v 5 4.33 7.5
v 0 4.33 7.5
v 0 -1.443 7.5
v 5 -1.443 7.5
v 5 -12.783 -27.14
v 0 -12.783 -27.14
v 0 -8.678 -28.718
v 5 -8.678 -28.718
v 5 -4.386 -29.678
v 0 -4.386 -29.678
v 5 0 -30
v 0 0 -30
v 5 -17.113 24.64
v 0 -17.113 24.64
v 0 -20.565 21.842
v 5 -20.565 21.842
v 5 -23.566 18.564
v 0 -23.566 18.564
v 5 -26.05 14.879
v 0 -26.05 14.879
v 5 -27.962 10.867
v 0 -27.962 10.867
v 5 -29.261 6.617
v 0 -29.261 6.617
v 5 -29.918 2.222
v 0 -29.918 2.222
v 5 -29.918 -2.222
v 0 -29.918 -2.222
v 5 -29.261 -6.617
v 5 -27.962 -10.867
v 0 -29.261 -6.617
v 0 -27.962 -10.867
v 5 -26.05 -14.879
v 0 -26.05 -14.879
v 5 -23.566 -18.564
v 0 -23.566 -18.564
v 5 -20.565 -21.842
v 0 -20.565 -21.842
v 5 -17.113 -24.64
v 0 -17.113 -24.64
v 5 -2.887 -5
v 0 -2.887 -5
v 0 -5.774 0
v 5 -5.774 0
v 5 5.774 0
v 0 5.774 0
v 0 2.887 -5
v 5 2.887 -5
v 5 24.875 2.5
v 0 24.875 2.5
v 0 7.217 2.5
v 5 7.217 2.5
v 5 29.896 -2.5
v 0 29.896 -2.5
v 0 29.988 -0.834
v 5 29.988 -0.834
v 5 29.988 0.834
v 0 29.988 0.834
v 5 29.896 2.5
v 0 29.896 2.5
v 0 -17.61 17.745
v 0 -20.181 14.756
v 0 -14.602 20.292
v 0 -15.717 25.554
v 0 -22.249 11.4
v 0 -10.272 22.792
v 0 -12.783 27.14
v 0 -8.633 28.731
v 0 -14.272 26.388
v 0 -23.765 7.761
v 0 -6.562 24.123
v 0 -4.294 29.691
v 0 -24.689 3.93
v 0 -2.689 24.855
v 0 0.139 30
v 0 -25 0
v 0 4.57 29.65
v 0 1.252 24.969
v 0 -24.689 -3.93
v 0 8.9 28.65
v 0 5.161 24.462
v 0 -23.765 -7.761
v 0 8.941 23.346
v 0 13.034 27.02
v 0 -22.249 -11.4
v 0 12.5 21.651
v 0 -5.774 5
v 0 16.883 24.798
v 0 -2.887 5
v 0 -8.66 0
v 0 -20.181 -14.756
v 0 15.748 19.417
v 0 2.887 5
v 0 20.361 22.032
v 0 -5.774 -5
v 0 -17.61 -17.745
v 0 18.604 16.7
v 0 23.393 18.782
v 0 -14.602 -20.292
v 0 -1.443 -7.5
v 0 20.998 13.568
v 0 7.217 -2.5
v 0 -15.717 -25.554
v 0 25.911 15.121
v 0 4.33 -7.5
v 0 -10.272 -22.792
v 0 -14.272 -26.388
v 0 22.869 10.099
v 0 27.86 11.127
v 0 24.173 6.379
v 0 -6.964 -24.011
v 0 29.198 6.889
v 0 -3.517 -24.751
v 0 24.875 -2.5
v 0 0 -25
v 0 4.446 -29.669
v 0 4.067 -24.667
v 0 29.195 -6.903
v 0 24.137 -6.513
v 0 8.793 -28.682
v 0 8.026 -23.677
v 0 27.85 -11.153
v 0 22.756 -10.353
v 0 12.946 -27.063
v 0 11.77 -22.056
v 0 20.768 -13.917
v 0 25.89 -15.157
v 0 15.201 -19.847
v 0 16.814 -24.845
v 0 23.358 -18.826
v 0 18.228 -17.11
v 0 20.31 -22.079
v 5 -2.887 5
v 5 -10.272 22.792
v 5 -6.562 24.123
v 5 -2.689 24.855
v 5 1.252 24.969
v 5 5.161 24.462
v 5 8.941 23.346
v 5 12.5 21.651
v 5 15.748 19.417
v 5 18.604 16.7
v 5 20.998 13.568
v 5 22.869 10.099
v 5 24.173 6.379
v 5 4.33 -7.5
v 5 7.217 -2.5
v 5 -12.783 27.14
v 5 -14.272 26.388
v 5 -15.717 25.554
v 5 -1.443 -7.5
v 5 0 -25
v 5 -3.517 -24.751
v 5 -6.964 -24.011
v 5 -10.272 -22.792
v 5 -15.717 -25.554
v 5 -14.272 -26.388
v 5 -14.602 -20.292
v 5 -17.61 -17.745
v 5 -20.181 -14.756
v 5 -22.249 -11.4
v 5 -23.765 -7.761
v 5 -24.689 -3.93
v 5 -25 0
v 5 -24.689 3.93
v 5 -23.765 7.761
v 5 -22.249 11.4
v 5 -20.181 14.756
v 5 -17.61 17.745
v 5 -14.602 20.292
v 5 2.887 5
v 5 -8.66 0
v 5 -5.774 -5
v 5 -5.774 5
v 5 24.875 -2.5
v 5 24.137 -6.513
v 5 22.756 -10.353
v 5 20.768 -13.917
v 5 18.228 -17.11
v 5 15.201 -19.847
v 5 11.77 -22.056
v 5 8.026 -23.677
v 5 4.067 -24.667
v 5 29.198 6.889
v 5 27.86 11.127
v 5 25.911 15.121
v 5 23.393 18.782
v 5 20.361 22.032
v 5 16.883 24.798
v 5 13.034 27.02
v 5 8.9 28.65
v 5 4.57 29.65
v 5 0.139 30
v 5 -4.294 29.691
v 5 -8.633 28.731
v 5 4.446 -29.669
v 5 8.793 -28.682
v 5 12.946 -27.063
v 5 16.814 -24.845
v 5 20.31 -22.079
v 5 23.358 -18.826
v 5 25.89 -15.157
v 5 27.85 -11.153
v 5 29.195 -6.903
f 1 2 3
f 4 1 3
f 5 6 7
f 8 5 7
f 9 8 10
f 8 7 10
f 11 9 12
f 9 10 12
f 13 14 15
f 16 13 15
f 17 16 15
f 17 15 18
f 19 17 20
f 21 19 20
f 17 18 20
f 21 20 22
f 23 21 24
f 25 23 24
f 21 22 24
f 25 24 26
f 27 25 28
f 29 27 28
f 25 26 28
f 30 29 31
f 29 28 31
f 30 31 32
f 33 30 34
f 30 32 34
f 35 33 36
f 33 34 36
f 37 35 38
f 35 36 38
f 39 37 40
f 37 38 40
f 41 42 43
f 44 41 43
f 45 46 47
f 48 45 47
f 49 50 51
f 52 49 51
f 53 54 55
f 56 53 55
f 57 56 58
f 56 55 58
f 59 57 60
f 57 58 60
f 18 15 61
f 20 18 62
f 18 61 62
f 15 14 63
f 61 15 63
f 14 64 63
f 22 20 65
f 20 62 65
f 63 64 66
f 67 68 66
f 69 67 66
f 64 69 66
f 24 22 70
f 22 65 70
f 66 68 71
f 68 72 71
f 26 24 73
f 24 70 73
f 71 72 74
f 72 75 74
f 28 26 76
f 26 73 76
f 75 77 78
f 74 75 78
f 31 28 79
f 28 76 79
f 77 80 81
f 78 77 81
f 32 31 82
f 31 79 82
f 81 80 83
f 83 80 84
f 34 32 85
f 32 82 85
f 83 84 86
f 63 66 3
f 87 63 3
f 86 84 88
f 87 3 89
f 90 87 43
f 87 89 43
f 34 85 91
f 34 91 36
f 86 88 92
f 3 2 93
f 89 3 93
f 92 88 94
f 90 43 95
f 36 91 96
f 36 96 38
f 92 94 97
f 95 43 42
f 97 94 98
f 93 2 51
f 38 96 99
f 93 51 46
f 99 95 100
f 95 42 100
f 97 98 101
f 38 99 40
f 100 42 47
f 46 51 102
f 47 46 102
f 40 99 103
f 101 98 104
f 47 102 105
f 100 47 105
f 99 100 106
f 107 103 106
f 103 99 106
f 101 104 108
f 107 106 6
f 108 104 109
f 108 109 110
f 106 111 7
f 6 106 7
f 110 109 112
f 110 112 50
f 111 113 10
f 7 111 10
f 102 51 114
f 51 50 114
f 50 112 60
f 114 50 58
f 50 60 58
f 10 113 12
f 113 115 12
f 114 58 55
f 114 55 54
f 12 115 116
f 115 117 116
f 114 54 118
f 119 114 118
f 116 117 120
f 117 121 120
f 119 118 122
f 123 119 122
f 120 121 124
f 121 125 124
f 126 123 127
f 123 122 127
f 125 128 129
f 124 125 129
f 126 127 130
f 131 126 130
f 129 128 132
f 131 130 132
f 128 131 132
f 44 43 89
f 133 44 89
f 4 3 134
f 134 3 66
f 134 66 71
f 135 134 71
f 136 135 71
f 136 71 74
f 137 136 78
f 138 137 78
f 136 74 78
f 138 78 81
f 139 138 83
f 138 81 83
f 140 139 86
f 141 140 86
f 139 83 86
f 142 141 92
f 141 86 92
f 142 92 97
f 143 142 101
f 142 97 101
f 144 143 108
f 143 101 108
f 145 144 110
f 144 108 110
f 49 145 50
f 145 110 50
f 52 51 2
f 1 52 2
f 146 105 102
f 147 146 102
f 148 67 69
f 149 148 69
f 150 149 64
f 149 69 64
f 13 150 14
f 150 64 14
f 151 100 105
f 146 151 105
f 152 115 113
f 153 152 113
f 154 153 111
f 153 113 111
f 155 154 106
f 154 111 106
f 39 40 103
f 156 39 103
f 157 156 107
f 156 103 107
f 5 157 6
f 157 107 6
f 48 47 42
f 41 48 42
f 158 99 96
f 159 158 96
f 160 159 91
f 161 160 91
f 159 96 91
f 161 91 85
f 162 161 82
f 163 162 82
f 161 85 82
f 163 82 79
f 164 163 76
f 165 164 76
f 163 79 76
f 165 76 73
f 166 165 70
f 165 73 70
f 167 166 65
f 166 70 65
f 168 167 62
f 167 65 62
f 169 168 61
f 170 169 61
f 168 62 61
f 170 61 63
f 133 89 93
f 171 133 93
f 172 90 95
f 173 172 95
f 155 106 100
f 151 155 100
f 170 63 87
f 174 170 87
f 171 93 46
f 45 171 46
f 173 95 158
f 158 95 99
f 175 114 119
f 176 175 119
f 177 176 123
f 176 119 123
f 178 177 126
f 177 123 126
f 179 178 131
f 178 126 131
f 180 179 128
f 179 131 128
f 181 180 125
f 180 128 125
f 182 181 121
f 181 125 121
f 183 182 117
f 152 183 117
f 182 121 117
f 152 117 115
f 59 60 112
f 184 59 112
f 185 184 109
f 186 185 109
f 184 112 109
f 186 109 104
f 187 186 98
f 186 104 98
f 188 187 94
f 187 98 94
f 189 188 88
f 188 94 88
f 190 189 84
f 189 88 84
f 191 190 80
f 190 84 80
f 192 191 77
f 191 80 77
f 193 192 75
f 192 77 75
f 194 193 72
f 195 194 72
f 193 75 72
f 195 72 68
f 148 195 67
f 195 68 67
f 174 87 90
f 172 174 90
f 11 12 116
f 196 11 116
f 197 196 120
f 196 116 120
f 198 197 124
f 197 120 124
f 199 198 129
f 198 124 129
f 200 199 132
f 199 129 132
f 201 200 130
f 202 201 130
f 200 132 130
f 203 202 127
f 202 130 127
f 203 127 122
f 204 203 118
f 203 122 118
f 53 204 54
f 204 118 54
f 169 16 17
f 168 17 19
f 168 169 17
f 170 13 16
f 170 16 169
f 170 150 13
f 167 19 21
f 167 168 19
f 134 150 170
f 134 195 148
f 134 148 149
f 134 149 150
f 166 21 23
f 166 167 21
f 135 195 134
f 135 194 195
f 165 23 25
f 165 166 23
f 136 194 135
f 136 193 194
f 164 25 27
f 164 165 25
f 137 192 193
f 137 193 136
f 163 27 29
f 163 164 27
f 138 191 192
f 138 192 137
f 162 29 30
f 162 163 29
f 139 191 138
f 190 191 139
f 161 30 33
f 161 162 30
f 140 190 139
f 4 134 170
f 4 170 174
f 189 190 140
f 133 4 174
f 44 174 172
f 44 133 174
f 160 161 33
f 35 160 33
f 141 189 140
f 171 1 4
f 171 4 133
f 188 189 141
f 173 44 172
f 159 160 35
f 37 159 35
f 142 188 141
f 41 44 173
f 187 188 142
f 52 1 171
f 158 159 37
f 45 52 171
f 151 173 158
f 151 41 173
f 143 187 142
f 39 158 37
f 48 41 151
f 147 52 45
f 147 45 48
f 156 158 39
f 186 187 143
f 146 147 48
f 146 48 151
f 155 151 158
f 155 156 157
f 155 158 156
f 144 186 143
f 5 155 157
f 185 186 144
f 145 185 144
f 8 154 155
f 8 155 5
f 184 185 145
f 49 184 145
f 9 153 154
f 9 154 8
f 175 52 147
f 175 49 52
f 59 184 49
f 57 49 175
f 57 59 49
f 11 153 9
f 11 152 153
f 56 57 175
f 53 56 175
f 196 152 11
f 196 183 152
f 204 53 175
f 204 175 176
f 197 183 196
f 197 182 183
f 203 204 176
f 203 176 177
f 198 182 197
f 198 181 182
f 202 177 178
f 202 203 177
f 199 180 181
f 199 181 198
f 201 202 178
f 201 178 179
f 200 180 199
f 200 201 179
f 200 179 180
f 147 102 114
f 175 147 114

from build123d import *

# Parameters (mm, degrees)
BOSS_EXTRUDE1_DEPTH = 5


with BuildPart() as part:
    # Sketch1 → Boss-Extrude1 (new body)
    with BuildSketch(Plane(origin=(0, 0, 0), x_dir=(0, 0, -1), z_dir=(1, 0, 0))):
        with BuildLine():
            Line((2.5, 29.895651858), (2.5, 24.874685928))
            ThreePointArc((2.5, 24.874685928), (18.540496218, 16.770509831), (25, 0))
            ThreePointArc((25, 0), (24.441795639, -5.253439439), (22.792109925, -10.272279454))
            Line((22.792109925, -10.272279454), (27.140393972, -12.782762419))
            ThreePointArc((27.140393972, -12.782762419), (29.276371182, -6.549358016), (30, 0))
            ThreePointArc((30, 0), (22.079402166, 20.310096012), (2.5, 29.895651858))
        make_face()
        with BuildLine():
            ThreePointArc((-22.792109925, -10.272279454), (-21.650635095, 12.5), (-2.5, 24.874685928))
            Line((-2.5, 24.874685928), (-2.5, 29.895651858))
            ThreePointArc((-2.5, 29.895651858), (-25.980762114, 15), (-27.140393972, -12.782762419))
            Line((-27.140393972, -12.782762419), (-22.792109925, -10.272279454))
        make_face()
        with BuildLine():
            Line((-2.5, 29.895651858), (-2.5, 24.874685928))
            ThreePointArc((-2.5, 24.874685928), (0, 25), (2.5, 24.874685928))
            Line((2.5, 24.874685928), (2.5, 29.895651858))
            ThreePointArc((2.5, 29.895651858), (0, 30), (-2.5, 29.895651858))
        make_face()
        with BuildLine():
            ThreePointArc((22.792109925, -10.272279454), (21.650635095, -12.5), (20.292109925, -14.602406473))
            Line((20.292109925, -14.602406473), (24.640393972, -17.112889438))
            ThreePointArc((24.640393972, -17.112889438), (25.980762114, -15), (27.140393972, -12.782762419))
            Line((27.140393972, -12.782762419), (22.792109925, -10.272279454))
        make_face()
        with BuildLine():
            ThreePointArc((20.292109925, -14.602406473), (0, -25), (-20.292109925, -14.602406473))
            Line((-20.292109925, -14.602406473), (-24.640393972, -17.112889438))
            ThreePointArc((-24.640393972, -17.112889438), (0, -30), (24.640393972, -17.112889438))
            Line((24.640393972, -17.112889438), (20.292109925, -14.602406473))
        make_face()
        with BuildLine():
            ThreePointArc((-20.292109925, -14.602406473), (-21.650635095, -12.5), (-22.792109925, -10.272279454))
            Line((-22.792109925, -10.272279454), (-27.140393972, -12.782762419))
            ThreePointArc((-27.140393972, -12.782762419), (-25.980762114, -15), (-24.640393972, -17.112889438))
            Line((-24.640393972, -17.112889438), (-20.292109925, -14.602406473))
        make_face()
        with BuildLine():
            Line((7.5, -4.330127019), (5, -5.773502692))
            Line((5, -5.773502692), (20.292109925, -14.602406473))
            ThreePointArc((20.292109925, -14.602406473), (21.650635095, -12.5), (22.792109925, -10.272279454))
            Line((22.792109925, -10.272279454), (7.5, -1.443375673))
            Line((7.5, -1.443375673), (7.5, -4.330127019))
        make_face()
        with BuildLine():
            Line((-7.5, -4.330127019), (-7.5, -1.443375673))
            Line((-7.5, -1.443375673), (-22.792109925, -10.272279454))
            ThreePointArc((-22.792109925, -10.272279454), (-21.650635095, -12.5), (-20.292109925, -14.602406473))
            Line((-20.292109925, -14.602406473), (-5, -5.773502692))
            Line((-5, -5.773502692), (-7.5, -4.330127019))
        make_face()
        with BuildLine():
            Line((-2.5, 24.874685928), (-2.5, 7.216878365))
            Line((-2.5, 7.216878365), (0, 8.660254038))
            Line((0, 8.660254038), (2.5, 7.216878365))
            Line((2.5, 7.216878365), (2.5, 24.874685928))
            ThreePointArc((2.5, 24.874685928), (0, 25), (-2.5, 24.874685928))
        make_face()
        Polygon((-5, 2.886751346), (-2.5, 4.330127019), (-2.5, 7.216878365), (-7.5, 4.330127019), (-7.5, -1.443375673), (-5, 0), align=None)
        Polygon((-2.5, 7.216878365), (-2.5, 4.330127019), (0, 5.773502692), (2.5, 4.330127019), (2.5, 7.216878365), (0, 8.660254038), align=None)
        Polygon((2.5, 7.216878365), (2.5, 4.330127019), (5, 2.886751346), (5, 0), (7.5, -1.443375673), (7.5, 4.330127019), align=None)
        Polygon((5, -2.886751346), (2.5, -4.330127019), (5, -5.773502692), (7.5, -4.330127019), (7.5, -1.443375673), (5, 0), align=None)
        Polygon((5, -5.773502692), (2.5, -4.330127019), (0, -5.773502692), (-2.5, -4.330127019), (-5, -5.773502692), (0, -8.660254038), align=None)
        Polygon((-5, -2.886751346), (-5, 0), (-7.5, -1.443375673), (-7.5, -4.330127019), (-5, -5.773502692), (-2.5, -4.330127019), align=None)
    extrude(amount=BOSS_EXTRUDE1_DEPTH)


solid = part.part
